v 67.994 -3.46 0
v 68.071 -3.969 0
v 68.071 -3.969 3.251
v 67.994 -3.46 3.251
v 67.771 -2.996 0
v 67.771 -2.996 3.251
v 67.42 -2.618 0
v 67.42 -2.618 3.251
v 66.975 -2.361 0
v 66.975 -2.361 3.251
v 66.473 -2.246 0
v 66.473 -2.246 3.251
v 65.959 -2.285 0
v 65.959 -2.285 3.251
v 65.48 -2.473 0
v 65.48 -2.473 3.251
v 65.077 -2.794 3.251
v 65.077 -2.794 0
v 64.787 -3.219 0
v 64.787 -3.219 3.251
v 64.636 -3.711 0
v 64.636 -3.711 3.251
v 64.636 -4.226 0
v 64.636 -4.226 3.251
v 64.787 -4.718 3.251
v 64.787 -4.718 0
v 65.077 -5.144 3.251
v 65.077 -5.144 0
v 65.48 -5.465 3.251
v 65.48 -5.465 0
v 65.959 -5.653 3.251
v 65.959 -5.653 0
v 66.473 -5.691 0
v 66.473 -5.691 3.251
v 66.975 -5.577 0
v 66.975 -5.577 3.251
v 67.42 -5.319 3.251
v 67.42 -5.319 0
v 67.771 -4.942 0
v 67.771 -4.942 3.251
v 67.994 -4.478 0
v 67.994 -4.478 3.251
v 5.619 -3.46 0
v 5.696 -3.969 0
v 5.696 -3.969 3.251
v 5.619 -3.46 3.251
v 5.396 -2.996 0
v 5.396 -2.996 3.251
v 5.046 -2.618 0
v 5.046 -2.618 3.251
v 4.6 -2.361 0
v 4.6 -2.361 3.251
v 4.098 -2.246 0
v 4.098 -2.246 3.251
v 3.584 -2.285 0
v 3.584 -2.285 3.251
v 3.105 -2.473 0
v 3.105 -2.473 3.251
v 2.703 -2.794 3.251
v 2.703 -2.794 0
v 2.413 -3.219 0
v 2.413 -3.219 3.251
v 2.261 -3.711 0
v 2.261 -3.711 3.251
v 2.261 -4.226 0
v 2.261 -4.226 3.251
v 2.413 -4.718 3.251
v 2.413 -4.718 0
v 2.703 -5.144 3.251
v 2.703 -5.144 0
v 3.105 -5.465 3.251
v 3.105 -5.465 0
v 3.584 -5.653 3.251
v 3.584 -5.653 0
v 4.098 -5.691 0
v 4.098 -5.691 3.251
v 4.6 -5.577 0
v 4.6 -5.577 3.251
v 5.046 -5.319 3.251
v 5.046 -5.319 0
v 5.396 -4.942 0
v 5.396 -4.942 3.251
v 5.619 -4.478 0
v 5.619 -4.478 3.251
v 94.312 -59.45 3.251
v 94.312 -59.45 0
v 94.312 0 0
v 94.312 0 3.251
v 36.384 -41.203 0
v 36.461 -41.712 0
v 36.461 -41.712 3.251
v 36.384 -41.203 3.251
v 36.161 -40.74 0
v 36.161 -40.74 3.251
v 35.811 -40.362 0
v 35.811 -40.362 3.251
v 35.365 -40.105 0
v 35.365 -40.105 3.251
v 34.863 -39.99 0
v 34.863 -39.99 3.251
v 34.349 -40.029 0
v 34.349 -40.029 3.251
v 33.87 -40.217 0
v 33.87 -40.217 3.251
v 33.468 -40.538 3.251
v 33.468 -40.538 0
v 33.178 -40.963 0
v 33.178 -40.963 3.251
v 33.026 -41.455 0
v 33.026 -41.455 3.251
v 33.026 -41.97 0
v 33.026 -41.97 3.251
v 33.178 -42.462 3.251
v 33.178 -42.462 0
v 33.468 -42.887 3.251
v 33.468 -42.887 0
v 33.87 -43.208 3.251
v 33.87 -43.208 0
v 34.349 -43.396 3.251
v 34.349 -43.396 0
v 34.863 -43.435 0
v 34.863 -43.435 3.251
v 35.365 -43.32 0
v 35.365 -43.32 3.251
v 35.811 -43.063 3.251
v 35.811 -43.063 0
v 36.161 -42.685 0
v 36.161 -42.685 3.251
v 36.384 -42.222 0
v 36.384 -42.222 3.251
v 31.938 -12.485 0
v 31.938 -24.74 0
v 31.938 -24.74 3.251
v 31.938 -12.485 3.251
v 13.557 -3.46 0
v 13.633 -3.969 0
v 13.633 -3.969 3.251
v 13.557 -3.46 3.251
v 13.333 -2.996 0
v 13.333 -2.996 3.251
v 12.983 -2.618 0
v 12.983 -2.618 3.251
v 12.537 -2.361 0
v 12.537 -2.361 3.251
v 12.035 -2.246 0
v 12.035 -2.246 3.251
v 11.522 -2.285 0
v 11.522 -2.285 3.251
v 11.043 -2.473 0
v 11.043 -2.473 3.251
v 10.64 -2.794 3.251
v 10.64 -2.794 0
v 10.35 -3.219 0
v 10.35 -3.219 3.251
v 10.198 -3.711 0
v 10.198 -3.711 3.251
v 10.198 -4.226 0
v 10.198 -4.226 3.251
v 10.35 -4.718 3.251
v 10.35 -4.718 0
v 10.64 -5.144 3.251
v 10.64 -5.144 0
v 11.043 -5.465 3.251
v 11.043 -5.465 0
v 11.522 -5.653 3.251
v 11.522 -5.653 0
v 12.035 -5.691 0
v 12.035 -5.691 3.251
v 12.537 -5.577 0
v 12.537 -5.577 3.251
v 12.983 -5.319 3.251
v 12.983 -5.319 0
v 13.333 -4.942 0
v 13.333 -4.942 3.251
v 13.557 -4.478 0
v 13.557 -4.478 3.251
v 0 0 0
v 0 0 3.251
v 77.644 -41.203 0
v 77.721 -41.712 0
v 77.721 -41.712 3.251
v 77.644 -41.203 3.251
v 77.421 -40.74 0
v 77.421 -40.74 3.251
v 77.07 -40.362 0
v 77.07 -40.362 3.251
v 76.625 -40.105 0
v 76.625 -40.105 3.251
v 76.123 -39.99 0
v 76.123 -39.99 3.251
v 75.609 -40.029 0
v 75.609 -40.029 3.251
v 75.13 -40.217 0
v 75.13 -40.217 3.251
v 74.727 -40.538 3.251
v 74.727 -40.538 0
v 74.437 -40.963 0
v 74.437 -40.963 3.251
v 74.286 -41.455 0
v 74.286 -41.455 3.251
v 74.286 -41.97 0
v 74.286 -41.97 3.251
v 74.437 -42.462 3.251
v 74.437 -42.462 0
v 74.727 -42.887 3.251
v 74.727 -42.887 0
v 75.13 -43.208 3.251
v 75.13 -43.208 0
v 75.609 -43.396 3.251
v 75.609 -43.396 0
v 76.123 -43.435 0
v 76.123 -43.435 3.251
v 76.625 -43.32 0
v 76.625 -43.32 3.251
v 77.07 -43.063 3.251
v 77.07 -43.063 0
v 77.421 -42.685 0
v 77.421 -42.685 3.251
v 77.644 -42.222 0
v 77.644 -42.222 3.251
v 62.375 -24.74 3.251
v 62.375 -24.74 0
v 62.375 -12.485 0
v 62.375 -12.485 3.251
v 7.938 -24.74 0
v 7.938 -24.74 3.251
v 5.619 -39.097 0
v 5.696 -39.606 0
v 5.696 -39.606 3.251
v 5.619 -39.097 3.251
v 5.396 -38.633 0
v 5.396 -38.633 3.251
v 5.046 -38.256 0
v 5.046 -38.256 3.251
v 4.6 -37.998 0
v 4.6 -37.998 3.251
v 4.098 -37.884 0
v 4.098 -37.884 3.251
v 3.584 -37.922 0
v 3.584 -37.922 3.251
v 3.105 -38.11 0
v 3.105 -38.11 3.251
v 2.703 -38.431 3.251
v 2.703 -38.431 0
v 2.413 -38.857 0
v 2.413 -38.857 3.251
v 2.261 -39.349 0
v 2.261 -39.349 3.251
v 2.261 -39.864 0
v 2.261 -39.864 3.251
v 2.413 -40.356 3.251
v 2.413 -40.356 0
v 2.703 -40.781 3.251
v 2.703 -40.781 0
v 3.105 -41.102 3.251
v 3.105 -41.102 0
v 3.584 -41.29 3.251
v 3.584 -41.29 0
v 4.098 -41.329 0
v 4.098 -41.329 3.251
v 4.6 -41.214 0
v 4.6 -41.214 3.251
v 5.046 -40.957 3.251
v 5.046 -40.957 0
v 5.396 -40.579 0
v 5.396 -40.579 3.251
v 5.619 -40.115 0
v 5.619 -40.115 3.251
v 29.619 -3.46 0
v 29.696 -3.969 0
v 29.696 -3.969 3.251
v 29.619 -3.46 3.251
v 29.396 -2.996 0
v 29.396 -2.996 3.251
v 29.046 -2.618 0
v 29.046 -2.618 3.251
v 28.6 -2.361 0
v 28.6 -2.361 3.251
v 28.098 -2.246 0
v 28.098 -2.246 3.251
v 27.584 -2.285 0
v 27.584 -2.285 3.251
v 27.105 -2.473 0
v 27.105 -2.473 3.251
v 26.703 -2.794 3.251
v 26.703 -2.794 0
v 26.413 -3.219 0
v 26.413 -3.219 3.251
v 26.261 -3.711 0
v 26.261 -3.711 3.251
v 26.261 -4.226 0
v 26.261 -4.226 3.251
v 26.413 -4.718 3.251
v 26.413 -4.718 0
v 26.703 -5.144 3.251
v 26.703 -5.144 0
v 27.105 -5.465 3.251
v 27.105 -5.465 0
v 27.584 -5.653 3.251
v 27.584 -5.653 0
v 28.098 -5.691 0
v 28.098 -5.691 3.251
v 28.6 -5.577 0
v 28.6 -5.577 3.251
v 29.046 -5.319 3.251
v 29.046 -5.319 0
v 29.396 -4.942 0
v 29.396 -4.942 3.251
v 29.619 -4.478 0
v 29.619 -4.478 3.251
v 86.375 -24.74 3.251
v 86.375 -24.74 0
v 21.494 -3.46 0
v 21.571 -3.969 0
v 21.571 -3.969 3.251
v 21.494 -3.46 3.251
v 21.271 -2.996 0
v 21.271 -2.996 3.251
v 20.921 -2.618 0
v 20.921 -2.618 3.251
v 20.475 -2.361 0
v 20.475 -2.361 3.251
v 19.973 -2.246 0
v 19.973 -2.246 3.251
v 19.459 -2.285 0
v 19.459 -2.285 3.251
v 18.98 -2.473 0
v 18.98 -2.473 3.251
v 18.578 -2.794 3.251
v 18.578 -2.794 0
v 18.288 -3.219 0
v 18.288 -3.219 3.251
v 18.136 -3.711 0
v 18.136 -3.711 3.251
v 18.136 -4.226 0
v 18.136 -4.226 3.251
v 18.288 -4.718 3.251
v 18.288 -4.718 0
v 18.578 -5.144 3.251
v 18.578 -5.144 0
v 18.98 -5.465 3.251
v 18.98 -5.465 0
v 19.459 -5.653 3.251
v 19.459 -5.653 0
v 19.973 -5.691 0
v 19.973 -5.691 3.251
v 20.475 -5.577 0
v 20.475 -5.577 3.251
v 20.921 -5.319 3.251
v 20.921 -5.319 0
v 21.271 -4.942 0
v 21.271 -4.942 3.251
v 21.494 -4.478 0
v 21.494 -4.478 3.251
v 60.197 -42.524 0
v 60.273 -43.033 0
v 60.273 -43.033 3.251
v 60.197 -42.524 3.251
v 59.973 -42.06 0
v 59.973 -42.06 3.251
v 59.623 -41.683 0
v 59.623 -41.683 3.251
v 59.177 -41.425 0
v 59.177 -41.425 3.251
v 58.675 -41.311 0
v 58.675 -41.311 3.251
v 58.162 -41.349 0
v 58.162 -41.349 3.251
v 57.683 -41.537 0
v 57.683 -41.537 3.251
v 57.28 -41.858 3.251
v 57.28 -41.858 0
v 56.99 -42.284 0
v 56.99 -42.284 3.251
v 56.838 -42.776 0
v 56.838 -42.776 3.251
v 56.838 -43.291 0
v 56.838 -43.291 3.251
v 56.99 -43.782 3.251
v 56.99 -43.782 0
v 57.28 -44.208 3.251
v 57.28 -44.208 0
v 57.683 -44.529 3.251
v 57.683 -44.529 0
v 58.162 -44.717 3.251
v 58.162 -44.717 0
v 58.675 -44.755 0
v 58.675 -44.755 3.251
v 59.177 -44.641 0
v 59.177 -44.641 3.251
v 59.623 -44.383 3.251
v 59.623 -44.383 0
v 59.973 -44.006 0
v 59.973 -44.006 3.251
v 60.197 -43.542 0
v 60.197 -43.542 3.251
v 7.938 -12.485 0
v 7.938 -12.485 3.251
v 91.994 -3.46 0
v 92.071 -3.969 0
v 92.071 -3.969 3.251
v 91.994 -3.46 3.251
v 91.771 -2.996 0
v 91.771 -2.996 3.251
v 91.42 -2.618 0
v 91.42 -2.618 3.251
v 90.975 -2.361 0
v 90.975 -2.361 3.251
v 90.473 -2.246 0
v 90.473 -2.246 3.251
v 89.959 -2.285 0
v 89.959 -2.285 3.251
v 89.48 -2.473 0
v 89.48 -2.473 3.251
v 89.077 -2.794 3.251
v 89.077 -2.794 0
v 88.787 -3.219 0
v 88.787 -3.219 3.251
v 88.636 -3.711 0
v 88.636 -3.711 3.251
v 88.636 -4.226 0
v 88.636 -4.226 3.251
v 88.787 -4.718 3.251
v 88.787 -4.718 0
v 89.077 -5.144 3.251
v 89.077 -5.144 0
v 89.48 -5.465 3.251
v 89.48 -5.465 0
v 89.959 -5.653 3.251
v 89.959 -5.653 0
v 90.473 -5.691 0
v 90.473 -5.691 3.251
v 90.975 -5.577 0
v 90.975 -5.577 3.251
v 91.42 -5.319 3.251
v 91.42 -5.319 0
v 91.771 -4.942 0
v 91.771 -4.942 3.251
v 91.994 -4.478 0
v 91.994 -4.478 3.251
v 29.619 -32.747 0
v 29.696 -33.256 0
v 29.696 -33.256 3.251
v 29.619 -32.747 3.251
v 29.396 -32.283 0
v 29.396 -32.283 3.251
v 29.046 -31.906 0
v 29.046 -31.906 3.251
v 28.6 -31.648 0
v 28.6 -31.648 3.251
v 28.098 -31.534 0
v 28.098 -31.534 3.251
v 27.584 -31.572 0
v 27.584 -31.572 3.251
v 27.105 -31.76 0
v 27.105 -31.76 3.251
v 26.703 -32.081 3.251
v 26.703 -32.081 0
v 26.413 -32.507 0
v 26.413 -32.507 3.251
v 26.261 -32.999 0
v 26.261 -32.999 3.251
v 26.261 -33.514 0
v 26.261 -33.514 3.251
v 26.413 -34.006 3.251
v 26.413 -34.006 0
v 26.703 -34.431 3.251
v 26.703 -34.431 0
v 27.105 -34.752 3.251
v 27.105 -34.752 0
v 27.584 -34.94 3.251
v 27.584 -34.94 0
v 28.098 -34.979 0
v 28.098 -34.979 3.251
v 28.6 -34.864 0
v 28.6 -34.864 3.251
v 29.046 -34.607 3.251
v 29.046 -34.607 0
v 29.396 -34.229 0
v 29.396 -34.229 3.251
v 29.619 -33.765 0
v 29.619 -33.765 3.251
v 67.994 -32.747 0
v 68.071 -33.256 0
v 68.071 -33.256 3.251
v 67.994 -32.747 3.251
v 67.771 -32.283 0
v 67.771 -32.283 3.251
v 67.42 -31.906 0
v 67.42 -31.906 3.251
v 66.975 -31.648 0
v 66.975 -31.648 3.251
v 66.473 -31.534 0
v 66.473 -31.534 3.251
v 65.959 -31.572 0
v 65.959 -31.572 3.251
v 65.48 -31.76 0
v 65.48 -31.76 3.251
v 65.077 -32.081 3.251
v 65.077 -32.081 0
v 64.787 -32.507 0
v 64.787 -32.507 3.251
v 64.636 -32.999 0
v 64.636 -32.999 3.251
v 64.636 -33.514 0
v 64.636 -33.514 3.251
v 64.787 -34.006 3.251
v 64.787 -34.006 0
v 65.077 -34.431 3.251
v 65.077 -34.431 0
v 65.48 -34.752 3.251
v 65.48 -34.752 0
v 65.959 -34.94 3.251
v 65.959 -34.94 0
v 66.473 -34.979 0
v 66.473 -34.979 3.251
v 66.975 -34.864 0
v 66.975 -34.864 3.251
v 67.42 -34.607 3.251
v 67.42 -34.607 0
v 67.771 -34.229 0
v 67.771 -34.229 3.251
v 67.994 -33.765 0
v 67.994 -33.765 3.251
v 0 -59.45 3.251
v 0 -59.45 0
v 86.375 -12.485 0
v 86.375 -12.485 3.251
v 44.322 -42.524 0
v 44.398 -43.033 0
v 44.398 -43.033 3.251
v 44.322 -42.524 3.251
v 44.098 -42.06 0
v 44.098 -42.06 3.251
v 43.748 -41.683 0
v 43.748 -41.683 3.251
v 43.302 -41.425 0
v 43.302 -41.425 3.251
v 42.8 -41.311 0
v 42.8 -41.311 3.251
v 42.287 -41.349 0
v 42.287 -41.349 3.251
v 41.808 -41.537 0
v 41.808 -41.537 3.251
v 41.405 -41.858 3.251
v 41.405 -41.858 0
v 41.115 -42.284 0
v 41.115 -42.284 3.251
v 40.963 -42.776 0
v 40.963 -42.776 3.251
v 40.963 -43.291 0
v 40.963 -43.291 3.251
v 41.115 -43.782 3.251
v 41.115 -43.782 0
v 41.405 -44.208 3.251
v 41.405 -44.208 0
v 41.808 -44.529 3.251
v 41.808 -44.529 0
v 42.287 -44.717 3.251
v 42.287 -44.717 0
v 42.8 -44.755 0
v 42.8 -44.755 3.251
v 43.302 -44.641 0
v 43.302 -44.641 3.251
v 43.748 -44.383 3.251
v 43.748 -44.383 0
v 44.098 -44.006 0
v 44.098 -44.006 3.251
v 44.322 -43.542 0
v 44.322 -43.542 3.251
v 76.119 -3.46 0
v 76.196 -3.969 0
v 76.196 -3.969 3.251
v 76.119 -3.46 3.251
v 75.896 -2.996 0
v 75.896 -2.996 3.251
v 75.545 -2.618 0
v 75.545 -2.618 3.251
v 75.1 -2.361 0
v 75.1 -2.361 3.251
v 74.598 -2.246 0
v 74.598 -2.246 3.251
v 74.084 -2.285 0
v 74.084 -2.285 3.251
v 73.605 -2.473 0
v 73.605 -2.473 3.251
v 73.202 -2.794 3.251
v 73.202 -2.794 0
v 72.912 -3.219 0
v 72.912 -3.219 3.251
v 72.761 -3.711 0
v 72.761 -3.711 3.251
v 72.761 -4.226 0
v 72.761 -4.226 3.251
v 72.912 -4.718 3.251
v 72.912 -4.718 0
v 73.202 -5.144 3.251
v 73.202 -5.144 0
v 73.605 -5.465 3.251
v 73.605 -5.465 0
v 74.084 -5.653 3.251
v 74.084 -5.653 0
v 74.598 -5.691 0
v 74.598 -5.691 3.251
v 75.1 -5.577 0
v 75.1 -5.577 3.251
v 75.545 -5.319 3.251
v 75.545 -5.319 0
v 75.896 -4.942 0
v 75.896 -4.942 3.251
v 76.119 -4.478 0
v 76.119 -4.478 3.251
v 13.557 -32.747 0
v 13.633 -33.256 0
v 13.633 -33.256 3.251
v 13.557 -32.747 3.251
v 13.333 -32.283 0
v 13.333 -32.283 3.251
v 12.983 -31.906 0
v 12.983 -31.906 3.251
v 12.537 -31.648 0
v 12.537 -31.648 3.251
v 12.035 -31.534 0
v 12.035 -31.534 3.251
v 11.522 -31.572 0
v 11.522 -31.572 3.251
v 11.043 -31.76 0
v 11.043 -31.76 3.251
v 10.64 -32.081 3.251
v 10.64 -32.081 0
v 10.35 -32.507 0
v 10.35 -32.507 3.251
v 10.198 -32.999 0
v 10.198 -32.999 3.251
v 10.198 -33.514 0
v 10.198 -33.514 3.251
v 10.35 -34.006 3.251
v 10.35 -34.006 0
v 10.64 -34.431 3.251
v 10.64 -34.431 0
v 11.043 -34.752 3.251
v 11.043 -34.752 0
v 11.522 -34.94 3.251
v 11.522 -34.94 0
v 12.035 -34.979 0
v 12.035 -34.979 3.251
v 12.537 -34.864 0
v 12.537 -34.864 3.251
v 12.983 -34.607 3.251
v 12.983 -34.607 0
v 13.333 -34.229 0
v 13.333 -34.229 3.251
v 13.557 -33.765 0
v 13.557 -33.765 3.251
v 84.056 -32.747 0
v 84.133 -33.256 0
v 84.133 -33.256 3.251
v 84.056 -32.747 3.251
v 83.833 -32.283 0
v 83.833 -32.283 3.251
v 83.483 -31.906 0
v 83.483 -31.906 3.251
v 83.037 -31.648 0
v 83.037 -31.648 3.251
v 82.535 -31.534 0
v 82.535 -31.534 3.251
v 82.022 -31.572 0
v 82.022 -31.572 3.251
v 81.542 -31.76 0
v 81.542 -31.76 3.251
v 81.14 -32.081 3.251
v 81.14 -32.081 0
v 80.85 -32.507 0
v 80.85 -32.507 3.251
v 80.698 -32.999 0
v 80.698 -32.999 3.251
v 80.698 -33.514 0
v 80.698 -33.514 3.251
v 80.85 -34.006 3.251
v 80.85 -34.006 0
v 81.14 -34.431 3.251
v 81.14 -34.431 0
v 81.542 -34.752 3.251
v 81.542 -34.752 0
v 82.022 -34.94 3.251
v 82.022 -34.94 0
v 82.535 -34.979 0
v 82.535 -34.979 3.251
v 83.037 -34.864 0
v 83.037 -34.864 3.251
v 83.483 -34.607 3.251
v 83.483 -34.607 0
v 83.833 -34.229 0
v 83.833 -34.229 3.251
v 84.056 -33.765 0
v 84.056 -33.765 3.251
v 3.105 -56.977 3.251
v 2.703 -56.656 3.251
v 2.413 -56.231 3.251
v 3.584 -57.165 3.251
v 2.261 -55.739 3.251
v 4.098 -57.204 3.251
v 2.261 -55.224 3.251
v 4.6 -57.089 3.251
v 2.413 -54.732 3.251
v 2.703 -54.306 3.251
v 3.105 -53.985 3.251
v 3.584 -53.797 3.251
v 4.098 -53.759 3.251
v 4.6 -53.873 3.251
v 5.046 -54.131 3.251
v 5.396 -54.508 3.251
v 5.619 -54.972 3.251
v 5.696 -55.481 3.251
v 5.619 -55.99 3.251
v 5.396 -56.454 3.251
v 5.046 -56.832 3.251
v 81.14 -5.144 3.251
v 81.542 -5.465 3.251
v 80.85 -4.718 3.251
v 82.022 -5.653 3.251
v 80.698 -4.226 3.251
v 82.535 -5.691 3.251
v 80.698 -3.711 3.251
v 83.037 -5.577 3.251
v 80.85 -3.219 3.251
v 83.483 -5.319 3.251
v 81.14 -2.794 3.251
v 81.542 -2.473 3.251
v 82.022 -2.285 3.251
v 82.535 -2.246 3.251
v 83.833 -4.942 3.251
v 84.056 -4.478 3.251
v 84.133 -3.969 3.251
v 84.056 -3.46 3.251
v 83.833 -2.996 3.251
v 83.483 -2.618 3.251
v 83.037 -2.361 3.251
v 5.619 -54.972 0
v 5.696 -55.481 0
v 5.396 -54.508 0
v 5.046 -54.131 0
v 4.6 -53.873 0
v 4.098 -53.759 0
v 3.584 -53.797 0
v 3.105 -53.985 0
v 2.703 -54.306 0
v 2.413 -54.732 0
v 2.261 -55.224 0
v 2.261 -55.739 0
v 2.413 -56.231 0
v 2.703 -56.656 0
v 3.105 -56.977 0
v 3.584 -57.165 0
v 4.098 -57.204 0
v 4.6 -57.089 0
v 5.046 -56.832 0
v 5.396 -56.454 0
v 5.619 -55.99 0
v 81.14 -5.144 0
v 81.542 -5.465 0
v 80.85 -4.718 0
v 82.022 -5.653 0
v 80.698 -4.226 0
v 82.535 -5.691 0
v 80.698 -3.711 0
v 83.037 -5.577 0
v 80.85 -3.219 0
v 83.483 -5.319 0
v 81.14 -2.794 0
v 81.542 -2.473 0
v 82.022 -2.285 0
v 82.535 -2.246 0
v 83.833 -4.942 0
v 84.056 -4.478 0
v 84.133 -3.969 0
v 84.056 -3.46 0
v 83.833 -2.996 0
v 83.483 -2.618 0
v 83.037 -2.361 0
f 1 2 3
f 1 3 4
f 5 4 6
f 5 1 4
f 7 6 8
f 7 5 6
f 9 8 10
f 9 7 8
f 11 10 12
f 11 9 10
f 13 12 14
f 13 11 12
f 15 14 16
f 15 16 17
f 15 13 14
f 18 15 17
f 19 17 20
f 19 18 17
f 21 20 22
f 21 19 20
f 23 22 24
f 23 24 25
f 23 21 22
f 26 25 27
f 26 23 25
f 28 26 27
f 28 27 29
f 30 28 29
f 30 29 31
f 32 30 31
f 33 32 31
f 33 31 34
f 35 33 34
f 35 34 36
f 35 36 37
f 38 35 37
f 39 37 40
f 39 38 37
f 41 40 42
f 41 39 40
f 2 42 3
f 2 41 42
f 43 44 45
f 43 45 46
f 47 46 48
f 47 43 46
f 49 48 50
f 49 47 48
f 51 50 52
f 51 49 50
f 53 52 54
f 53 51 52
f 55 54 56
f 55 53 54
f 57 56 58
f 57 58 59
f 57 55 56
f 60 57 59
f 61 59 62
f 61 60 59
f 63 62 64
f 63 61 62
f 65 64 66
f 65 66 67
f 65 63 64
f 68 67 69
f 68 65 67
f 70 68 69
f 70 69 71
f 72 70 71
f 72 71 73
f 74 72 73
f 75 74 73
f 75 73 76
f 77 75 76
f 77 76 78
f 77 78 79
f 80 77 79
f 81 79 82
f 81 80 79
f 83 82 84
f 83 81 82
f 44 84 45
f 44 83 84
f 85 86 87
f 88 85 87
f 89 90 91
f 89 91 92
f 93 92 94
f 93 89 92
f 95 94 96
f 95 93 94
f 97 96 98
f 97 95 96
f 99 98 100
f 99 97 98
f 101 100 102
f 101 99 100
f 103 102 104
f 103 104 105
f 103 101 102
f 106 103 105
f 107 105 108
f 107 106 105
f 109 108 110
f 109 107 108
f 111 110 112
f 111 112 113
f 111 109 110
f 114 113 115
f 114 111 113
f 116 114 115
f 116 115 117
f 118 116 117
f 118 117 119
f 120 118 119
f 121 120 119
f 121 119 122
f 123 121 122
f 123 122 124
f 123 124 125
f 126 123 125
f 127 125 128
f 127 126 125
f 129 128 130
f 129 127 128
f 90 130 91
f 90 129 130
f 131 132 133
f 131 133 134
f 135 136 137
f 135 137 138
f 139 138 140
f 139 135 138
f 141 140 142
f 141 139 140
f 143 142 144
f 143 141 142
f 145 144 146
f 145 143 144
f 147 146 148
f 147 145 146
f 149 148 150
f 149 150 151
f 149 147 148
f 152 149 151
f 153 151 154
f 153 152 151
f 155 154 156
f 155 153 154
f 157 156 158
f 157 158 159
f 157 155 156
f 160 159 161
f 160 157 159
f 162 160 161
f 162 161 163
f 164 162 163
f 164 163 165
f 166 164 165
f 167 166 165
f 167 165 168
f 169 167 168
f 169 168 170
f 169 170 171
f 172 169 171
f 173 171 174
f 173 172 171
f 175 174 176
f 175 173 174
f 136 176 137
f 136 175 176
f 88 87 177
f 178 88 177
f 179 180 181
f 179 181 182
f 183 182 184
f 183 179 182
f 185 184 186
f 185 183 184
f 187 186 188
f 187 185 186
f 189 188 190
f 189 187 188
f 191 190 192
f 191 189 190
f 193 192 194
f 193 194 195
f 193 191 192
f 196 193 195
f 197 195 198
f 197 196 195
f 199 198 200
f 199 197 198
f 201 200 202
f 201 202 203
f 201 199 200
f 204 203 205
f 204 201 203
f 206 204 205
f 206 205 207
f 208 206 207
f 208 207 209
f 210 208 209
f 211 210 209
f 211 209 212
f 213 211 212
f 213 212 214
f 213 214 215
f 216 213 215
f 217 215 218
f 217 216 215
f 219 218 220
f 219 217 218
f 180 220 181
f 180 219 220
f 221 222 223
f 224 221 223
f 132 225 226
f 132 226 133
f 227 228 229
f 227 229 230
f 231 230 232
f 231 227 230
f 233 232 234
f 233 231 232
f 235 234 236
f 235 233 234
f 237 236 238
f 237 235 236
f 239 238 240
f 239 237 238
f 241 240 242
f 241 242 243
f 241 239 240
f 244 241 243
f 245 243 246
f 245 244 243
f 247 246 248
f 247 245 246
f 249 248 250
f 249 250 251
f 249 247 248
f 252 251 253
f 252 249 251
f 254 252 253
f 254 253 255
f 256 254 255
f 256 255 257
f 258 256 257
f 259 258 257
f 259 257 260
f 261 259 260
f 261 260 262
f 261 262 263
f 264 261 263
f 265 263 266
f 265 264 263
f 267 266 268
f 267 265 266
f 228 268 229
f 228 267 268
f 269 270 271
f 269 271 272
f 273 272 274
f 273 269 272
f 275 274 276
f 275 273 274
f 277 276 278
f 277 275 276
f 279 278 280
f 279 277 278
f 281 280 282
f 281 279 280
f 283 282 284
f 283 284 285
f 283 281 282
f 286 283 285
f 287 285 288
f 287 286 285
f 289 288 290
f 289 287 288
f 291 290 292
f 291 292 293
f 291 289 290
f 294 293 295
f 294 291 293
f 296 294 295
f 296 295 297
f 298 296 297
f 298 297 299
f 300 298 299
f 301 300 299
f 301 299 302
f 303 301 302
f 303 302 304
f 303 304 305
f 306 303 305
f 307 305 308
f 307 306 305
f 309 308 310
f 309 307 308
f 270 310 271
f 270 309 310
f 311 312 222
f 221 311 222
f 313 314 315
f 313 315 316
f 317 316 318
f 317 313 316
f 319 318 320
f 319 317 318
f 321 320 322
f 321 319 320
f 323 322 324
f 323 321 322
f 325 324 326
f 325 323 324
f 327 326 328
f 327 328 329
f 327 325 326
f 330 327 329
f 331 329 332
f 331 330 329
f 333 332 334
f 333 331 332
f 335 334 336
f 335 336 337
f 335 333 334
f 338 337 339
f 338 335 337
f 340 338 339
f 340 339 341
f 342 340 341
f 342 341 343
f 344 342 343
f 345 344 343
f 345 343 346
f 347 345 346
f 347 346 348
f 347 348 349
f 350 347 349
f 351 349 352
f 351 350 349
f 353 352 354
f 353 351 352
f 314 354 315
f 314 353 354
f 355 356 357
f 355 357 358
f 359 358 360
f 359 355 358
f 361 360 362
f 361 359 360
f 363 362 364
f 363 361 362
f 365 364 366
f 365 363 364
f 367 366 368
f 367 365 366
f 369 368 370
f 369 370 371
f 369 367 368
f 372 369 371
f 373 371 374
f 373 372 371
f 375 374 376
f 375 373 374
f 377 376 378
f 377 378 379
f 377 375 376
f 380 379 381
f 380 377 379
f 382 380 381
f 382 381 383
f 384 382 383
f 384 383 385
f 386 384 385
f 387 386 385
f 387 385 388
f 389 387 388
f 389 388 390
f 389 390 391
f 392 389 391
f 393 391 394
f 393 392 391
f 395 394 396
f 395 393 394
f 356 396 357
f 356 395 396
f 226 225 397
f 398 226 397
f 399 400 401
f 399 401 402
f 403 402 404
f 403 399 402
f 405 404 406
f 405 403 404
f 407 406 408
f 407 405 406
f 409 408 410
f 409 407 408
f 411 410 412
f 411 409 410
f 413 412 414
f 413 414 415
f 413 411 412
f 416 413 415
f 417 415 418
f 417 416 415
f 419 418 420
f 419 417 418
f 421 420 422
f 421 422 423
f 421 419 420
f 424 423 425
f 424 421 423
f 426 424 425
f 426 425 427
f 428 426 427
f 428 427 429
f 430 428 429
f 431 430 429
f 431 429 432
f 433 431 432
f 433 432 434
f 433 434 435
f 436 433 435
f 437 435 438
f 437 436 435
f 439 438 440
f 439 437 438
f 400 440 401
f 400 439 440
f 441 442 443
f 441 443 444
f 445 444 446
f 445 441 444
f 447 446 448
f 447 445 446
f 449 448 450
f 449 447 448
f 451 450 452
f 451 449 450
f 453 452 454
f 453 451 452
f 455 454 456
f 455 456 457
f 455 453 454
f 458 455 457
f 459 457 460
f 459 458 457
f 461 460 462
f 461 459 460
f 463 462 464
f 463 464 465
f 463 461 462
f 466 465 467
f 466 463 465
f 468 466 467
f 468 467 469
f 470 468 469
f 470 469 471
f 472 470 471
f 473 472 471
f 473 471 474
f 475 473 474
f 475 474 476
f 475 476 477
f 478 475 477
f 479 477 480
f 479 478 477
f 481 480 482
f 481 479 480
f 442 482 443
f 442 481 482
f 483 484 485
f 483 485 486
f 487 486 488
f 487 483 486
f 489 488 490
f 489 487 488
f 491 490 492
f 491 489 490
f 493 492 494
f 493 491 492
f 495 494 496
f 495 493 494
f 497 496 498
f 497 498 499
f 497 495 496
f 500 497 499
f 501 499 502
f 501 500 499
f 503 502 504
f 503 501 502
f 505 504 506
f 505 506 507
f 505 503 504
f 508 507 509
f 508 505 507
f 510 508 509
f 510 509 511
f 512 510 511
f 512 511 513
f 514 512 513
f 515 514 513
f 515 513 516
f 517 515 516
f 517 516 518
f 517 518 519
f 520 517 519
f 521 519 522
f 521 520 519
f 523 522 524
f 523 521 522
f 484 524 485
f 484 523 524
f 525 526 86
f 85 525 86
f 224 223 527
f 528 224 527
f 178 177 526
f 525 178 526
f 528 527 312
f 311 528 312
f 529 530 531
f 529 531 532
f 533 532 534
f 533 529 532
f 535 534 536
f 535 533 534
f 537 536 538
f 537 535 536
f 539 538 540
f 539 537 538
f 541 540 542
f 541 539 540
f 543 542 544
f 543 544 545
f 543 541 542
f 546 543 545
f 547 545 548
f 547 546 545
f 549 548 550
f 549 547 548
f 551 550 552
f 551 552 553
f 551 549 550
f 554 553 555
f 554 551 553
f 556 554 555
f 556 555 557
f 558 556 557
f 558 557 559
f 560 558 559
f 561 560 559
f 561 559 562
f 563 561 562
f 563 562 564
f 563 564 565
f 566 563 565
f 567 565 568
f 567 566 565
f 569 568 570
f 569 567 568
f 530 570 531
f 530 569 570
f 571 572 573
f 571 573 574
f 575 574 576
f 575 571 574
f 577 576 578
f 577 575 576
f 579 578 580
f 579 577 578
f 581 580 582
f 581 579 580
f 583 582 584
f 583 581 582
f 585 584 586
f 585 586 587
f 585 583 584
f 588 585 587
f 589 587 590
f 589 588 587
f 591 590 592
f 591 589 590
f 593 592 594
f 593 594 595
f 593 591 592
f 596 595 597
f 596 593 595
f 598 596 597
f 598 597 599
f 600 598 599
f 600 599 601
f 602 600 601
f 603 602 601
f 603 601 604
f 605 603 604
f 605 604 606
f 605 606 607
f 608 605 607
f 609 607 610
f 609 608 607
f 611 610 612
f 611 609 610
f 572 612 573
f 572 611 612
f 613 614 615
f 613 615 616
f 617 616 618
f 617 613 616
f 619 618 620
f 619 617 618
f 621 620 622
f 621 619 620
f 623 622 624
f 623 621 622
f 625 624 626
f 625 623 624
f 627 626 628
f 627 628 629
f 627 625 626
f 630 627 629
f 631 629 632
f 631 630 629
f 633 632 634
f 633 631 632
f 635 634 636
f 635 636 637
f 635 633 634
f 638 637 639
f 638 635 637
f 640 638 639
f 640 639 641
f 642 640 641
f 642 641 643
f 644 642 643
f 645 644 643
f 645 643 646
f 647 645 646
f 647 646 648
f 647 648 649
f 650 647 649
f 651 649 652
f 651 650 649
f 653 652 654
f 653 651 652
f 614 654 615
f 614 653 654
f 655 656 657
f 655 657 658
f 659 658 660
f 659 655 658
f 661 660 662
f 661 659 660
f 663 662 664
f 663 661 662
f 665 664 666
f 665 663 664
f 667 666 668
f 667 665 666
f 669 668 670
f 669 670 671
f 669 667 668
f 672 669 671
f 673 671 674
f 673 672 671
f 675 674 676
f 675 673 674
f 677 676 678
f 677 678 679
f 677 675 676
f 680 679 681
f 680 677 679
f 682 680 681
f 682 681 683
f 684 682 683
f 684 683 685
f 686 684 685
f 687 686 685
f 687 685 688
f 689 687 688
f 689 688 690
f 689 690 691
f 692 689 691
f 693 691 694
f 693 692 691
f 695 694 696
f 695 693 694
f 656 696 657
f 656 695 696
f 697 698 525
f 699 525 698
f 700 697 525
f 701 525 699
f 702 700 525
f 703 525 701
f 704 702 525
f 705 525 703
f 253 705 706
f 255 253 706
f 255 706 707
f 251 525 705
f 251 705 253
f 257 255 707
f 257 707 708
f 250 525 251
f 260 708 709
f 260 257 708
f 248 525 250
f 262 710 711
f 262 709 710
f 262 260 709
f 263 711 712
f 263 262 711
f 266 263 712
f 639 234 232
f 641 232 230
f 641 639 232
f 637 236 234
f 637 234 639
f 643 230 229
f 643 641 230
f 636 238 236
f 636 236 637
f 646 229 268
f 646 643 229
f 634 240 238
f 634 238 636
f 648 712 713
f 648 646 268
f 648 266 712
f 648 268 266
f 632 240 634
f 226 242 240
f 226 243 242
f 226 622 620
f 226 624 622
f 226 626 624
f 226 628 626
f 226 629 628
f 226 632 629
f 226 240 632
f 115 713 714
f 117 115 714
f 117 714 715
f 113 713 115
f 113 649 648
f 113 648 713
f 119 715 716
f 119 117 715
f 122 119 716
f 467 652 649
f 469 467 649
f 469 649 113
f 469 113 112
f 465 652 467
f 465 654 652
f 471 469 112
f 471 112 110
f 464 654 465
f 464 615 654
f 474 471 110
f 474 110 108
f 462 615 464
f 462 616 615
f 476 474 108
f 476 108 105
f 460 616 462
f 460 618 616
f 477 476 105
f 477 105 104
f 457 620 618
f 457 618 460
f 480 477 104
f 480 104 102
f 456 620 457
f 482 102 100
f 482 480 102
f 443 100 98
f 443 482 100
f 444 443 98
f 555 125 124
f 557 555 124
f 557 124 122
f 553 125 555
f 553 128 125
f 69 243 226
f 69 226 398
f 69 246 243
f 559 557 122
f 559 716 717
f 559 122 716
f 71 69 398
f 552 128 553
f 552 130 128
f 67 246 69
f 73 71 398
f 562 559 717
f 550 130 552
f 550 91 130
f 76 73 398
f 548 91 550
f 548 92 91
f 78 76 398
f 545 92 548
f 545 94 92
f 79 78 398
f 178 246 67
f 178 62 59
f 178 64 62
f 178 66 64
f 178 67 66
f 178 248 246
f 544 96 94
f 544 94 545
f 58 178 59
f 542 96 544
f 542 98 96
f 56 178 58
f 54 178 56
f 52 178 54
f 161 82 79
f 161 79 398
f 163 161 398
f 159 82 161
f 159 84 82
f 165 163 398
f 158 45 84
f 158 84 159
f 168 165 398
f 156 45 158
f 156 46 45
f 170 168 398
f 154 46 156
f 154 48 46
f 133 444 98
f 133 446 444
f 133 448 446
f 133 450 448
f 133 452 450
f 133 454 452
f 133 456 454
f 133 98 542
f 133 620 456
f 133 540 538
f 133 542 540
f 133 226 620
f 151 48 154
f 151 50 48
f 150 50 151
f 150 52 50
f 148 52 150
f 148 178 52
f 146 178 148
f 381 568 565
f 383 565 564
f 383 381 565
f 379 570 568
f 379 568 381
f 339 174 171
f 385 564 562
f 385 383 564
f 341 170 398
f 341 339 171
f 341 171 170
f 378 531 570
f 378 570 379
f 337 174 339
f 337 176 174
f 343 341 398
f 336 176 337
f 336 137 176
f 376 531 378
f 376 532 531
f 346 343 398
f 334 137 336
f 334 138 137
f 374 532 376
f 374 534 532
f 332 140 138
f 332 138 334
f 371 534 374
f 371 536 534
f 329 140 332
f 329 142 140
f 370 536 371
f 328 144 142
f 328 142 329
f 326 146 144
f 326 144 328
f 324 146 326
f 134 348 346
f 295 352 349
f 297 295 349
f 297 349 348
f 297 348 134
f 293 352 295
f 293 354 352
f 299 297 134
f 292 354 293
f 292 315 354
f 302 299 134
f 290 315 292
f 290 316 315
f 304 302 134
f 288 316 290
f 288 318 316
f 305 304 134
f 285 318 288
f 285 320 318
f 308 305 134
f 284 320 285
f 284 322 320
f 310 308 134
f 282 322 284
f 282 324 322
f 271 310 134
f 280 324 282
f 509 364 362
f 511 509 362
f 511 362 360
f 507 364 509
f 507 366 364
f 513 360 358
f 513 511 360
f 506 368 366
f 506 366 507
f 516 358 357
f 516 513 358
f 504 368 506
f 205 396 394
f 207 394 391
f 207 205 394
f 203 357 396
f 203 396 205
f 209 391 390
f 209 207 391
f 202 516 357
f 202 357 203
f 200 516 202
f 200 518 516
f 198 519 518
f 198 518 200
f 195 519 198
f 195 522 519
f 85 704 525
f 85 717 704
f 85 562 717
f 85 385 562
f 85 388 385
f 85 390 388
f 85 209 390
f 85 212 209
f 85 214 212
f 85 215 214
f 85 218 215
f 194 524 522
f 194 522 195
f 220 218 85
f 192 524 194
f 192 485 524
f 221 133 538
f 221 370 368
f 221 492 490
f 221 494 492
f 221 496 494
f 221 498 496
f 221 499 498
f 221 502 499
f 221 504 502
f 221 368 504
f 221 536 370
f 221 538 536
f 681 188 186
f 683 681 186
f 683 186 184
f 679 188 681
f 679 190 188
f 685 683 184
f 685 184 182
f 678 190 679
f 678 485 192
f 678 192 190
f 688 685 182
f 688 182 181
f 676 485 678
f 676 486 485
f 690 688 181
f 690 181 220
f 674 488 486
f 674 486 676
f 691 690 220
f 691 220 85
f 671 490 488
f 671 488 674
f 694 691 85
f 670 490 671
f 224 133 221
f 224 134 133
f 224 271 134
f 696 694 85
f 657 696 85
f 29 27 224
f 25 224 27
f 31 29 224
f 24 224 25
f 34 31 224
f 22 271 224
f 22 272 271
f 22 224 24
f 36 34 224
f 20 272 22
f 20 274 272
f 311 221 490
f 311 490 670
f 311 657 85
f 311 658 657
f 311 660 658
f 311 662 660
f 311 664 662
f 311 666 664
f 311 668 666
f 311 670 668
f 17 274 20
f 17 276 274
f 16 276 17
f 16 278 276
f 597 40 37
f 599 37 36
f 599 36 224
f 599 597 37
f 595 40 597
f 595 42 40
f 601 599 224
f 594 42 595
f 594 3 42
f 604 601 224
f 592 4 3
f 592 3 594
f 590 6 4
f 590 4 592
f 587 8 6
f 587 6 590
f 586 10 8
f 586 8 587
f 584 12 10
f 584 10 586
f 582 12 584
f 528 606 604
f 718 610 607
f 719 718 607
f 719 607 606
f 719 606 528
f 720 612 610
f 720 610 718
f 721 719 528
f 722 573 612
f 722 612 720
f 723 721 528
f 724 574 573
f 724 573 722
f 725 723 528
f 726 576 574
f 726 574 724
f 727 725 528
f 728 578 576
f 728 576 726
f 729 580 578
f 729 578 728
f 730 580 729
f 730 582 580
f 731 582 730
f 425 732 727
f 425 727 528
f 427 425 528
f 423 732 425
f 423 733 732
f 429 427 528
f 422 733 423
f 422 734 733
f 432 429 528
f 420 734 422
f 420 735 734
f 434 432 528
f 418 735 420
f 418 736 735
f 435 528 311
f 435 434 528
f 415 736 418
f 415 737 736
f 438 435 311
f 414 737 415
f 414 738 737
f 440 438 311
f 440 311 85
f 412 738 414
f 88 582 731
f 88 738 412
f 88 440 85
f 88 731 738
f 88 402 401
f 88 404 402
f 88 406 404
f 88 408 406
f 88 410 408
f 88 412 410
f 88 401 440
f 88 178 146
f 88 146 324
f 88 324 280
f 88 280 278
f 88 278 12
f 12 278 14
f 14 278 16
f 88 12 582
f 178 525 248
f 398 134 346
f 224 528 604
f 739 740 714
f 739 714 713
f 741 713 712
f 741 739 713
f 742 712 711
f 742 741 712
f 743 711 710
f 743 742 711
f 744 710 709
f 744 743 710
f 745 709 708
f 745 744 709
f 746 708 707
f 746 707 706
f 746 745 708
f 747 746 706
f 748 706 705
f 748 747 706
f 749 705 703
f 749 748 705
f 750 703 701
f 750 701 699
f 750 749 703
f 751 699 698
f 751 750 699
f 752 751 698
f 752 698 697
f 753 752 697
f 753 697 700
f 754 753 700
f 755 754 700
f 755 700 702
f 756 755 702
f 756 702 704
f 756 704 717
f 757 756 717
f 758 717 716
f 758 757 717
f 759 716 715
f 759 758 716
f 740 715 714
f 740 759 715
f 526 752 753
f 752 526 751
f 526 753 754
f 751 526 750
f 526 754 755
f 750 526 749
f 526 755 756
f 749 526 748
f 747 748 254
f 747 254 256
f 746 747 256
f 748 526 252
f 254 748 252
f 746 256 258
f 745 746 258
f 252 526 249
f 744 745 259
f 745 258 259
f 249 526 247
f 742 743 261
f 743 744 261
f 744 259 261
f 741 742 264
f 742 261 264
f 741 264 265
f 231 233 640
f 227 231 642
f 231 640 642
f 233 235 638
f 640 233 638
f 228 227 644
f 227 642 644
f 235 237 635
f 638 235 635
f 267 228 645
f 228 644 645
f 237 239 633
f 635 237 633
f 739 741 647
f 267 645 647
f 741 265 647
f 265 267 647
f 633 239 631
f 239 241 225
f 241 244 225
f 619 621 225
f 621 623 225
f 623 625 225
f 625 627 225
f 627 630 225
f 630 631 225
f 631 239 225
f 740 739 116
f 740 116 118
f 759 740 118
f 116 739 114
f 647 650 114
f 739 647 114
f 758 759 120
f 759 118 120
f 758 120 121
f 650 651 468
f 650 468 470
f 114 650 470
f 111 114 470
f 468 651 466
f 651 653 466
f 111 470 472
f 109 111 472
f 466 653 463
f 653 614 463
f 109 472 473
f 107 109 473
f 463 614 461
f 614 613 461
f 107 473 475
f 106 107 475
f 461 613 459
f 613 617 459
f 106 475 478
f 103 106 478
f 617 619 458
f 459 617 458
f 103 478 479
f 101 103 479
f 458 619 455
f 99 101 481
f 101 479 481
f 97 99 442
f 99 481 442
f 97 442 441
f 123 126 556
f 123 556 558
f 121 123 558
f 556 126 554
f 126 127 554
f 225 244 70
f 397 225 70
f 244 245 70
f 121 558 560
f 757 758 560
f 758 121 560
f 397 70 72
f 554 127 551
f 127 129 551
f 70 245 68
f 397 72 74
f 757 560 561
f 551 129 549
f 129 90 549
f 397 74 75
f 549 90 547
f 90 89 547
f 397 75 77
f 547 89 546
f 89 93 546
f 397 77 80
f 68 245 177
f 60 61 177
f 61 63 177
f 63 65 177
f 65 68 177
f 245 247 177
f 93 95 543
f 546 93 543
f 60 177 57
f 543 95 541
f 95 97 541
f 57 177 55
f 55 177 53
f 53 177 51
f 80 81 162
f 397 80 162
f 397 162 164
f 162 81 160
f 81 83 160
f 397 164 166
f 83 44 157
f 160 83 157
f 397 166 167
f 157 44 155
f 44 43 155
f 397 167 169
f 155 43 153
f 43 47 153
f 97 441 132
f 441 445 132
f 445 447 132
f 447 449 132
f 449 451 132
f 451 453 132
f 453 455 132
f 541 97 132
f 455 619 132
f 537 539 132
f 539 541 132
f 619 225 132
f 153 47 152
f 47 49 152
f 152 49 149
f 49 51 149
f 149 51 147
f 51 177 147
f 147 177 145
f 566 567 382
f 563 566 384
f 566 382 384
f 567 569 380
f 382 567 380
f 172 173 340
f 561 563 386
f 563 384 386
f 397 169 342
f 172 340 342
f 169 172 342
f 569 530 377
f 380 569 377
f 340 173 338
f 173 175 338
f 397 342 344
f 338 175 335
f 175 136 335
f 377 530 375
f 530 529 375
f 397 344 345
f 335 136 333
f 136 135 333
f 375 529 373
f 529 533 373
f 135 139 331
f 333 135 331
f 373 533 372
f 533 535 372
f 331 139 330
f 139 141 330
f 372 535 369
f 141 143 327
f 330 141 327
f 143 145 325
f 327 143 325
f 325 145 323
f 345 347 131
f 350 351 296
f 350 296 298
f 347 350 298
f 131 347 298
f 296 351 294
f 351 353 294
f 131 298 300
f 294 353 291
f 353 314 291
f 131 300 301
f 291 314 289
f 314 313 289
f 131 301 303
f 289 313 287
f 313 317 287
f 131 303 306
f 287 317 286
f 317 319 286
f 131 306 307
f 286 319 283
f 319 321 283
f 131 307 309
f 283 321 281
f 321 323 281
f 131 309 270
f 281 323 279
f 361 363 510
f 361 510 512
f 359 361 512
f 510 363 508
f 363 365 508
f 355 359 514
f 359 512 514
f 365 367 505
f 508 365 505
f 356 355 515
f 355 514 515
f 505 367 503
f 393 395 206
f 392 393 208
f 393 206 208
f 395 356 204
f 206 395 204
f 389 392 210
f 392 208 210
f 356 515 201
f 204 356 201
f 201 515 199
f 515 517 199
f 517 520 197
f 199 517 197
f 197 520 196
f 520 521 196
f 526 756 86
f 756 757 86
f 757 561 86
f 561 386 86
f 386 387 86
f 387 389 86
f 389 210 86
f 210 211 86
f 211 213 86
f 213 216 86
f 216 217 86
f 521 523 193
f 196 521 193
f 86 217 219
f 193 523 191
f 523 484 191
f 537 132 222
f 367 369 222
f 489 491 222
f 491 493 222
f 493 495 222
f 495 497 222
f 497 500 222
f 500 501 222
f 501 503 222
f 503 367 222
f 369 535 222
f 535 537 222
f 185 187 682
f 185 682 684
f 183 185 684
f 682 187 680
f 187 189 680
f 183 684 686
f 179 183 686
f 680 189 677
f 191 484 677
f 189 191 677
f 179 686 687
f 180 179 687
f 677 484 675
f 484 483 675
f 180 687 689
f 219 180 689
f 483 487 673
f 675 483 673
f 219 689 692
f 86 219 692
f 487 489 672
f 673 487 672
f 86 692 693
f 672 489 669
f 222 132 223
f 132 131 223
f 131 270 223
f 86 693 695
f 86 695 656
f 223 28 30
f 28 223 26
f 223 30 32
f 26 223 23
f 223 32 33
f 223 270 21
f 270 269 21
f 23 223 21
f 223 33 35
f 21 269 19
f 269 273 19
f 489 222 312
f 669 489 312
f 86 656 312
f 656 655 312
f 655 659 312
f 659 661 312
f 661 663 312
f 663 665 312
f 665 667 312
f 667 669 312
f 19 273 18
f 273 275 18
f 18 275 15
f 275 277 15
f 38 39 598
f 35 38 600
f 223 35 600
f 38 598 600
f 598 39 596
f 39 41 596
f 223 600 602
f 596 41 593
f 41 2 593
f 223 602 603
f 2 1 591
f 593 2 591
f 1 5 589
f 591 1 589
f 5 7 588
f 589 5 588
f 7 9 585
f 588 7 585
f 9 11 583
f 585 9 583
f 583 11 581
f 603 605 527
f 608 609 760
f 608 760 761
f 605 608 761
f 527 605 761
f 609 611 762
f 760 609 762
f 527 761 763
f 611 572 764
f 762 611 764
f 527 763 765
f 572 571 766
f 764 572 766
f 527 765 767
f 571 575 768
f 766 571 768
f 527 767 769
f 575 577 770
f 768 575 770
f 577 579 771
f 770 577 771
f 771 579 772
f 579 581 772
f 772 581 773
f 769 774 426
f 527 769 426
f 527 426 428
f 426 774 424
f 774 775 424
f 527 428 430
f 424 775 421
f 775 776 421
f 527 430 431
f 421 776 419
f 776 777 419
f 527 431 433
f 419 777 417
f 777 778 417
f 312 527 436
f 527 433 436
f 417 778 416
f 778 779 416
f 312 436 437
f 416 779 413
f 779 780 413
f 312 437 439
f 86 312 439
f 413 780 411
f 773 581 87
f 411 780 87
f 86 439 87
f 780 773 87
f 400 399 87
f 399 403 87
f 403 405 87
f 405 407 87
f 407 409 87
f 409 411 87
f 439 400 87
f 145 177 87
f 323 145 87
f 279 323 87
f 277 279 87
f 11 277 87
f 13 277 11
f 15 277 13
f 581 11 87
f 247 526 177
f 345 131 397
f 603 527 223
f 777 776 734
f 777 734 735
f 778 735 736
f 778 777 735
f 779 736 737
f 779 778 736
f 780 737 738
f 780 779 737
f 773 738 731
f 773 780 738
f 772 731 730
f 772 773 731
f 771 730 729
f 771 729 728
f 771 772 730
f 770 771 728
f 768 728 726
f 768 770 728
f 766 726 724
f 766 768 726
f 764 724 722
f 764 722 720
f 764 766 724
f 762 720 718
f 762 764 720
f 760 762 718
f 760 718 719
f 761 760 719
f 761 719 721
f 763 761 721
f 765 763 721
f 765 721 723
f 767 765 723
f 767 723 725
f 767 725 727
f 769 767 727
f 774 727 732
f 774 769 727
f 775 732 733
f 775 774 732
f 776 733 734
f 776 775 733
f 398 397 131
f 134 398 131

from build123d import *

# Parameters (mm, degrees)
F0_R     = 1.7272
F0_W     = 24
F0_H     = 12.254687
F1_DEPTH = 3.2512


with BuildPart() as f1:
    # F0 (on Top) → F1 (new body)
    with BuildSketch(Plane.XY):
        Polygon((94.31227, 0), (0, 0), (0, -59.449995), (94.31227, -59.449995), (94.31227, -18.612498), align=None)
        with Locations((3.96875, -55.481245)):
            Circle(F0_R, mode=Mode.SUBTRACT)
        with Locations((3.96875, -39.606245)):
            Circle(F0_R, mode=Mode.SUBTRACT)
        with Locations((11.90625, -33.256245)):
            Circle(F0_R, mode=Mode.SUBTRACT)
        with Locations((34.733674, -41.71249)):
            Circle(F0_R, mode=Mode.SUBTRACT)
        with Locations((42.671175, -43.033084)):
            Circle(F0_R, mode=Mode.SUBTRACT)
        with Locations((27.968753, -33.256245)):
            Circle(F0_R, mode=Mode.SUBTRACT)
        with Locations((58.546175, -43.033084)):
            Circle(F0_R, mode=Mode.SUBTRACT)
        with Locations((66.343517, -33.256245)):
            Circle(F0_R, mode=Mode.SUBTRACT)
        with Locations((75.993511, -41.71249)):
            Circle(F0_R, mode=Mode.SUBTRACT)
        with Locations((82.40602, -33.256245)):
            Circle(F0_R, mode=Mode.SUBTRACT)
        with Locations((19.9375, -18.612497)):
            Rectangle(F0_W, F0_H, mode=Mode.SUBTRACT)
        with Locations((3.96875, -3.96875)):
            Circle(F0_R, mode=Mode.SUBTRACT)
        with Locations((11.90625, -3.96875)):
            Circle(F0_R, mode=Mode.SUBTRACT)
        with Locations((19.84375, -3.96875)):
            Circle(F0_R, mode=Mode.SUBTRACT)
        with Locations((27.968753, -3.96875)):
            Circle(F0_R, mode=Mode.SUBTRACT)
        Polygon((86.37477, -12.485154), (86.37477, -18.612498), (86.37477, -24.739841), (62.37477, -24.739841), (62.37477, -12.485154), align=None, mode=Mode.SUBTRACT)
        with Locations((66.343517, -3.96875)):
            Circle(F0_R, mode=Mode.SUBTRACT)
        with Locations((74.46852, -3.96875)):
            Circle(F0_R, mode=Mode.SUBTRACT)
        with Locations((82.40602, -3.96875)):
            Circle(F0_R, mode=Mode.SUBTRACT)
        with Locations((90.34352, -3.96875)):
            Circle(F0_R, mode=Mode.SUBTRACT)
    extrude(amount=F1_DEPTH)


solid = f1.part
